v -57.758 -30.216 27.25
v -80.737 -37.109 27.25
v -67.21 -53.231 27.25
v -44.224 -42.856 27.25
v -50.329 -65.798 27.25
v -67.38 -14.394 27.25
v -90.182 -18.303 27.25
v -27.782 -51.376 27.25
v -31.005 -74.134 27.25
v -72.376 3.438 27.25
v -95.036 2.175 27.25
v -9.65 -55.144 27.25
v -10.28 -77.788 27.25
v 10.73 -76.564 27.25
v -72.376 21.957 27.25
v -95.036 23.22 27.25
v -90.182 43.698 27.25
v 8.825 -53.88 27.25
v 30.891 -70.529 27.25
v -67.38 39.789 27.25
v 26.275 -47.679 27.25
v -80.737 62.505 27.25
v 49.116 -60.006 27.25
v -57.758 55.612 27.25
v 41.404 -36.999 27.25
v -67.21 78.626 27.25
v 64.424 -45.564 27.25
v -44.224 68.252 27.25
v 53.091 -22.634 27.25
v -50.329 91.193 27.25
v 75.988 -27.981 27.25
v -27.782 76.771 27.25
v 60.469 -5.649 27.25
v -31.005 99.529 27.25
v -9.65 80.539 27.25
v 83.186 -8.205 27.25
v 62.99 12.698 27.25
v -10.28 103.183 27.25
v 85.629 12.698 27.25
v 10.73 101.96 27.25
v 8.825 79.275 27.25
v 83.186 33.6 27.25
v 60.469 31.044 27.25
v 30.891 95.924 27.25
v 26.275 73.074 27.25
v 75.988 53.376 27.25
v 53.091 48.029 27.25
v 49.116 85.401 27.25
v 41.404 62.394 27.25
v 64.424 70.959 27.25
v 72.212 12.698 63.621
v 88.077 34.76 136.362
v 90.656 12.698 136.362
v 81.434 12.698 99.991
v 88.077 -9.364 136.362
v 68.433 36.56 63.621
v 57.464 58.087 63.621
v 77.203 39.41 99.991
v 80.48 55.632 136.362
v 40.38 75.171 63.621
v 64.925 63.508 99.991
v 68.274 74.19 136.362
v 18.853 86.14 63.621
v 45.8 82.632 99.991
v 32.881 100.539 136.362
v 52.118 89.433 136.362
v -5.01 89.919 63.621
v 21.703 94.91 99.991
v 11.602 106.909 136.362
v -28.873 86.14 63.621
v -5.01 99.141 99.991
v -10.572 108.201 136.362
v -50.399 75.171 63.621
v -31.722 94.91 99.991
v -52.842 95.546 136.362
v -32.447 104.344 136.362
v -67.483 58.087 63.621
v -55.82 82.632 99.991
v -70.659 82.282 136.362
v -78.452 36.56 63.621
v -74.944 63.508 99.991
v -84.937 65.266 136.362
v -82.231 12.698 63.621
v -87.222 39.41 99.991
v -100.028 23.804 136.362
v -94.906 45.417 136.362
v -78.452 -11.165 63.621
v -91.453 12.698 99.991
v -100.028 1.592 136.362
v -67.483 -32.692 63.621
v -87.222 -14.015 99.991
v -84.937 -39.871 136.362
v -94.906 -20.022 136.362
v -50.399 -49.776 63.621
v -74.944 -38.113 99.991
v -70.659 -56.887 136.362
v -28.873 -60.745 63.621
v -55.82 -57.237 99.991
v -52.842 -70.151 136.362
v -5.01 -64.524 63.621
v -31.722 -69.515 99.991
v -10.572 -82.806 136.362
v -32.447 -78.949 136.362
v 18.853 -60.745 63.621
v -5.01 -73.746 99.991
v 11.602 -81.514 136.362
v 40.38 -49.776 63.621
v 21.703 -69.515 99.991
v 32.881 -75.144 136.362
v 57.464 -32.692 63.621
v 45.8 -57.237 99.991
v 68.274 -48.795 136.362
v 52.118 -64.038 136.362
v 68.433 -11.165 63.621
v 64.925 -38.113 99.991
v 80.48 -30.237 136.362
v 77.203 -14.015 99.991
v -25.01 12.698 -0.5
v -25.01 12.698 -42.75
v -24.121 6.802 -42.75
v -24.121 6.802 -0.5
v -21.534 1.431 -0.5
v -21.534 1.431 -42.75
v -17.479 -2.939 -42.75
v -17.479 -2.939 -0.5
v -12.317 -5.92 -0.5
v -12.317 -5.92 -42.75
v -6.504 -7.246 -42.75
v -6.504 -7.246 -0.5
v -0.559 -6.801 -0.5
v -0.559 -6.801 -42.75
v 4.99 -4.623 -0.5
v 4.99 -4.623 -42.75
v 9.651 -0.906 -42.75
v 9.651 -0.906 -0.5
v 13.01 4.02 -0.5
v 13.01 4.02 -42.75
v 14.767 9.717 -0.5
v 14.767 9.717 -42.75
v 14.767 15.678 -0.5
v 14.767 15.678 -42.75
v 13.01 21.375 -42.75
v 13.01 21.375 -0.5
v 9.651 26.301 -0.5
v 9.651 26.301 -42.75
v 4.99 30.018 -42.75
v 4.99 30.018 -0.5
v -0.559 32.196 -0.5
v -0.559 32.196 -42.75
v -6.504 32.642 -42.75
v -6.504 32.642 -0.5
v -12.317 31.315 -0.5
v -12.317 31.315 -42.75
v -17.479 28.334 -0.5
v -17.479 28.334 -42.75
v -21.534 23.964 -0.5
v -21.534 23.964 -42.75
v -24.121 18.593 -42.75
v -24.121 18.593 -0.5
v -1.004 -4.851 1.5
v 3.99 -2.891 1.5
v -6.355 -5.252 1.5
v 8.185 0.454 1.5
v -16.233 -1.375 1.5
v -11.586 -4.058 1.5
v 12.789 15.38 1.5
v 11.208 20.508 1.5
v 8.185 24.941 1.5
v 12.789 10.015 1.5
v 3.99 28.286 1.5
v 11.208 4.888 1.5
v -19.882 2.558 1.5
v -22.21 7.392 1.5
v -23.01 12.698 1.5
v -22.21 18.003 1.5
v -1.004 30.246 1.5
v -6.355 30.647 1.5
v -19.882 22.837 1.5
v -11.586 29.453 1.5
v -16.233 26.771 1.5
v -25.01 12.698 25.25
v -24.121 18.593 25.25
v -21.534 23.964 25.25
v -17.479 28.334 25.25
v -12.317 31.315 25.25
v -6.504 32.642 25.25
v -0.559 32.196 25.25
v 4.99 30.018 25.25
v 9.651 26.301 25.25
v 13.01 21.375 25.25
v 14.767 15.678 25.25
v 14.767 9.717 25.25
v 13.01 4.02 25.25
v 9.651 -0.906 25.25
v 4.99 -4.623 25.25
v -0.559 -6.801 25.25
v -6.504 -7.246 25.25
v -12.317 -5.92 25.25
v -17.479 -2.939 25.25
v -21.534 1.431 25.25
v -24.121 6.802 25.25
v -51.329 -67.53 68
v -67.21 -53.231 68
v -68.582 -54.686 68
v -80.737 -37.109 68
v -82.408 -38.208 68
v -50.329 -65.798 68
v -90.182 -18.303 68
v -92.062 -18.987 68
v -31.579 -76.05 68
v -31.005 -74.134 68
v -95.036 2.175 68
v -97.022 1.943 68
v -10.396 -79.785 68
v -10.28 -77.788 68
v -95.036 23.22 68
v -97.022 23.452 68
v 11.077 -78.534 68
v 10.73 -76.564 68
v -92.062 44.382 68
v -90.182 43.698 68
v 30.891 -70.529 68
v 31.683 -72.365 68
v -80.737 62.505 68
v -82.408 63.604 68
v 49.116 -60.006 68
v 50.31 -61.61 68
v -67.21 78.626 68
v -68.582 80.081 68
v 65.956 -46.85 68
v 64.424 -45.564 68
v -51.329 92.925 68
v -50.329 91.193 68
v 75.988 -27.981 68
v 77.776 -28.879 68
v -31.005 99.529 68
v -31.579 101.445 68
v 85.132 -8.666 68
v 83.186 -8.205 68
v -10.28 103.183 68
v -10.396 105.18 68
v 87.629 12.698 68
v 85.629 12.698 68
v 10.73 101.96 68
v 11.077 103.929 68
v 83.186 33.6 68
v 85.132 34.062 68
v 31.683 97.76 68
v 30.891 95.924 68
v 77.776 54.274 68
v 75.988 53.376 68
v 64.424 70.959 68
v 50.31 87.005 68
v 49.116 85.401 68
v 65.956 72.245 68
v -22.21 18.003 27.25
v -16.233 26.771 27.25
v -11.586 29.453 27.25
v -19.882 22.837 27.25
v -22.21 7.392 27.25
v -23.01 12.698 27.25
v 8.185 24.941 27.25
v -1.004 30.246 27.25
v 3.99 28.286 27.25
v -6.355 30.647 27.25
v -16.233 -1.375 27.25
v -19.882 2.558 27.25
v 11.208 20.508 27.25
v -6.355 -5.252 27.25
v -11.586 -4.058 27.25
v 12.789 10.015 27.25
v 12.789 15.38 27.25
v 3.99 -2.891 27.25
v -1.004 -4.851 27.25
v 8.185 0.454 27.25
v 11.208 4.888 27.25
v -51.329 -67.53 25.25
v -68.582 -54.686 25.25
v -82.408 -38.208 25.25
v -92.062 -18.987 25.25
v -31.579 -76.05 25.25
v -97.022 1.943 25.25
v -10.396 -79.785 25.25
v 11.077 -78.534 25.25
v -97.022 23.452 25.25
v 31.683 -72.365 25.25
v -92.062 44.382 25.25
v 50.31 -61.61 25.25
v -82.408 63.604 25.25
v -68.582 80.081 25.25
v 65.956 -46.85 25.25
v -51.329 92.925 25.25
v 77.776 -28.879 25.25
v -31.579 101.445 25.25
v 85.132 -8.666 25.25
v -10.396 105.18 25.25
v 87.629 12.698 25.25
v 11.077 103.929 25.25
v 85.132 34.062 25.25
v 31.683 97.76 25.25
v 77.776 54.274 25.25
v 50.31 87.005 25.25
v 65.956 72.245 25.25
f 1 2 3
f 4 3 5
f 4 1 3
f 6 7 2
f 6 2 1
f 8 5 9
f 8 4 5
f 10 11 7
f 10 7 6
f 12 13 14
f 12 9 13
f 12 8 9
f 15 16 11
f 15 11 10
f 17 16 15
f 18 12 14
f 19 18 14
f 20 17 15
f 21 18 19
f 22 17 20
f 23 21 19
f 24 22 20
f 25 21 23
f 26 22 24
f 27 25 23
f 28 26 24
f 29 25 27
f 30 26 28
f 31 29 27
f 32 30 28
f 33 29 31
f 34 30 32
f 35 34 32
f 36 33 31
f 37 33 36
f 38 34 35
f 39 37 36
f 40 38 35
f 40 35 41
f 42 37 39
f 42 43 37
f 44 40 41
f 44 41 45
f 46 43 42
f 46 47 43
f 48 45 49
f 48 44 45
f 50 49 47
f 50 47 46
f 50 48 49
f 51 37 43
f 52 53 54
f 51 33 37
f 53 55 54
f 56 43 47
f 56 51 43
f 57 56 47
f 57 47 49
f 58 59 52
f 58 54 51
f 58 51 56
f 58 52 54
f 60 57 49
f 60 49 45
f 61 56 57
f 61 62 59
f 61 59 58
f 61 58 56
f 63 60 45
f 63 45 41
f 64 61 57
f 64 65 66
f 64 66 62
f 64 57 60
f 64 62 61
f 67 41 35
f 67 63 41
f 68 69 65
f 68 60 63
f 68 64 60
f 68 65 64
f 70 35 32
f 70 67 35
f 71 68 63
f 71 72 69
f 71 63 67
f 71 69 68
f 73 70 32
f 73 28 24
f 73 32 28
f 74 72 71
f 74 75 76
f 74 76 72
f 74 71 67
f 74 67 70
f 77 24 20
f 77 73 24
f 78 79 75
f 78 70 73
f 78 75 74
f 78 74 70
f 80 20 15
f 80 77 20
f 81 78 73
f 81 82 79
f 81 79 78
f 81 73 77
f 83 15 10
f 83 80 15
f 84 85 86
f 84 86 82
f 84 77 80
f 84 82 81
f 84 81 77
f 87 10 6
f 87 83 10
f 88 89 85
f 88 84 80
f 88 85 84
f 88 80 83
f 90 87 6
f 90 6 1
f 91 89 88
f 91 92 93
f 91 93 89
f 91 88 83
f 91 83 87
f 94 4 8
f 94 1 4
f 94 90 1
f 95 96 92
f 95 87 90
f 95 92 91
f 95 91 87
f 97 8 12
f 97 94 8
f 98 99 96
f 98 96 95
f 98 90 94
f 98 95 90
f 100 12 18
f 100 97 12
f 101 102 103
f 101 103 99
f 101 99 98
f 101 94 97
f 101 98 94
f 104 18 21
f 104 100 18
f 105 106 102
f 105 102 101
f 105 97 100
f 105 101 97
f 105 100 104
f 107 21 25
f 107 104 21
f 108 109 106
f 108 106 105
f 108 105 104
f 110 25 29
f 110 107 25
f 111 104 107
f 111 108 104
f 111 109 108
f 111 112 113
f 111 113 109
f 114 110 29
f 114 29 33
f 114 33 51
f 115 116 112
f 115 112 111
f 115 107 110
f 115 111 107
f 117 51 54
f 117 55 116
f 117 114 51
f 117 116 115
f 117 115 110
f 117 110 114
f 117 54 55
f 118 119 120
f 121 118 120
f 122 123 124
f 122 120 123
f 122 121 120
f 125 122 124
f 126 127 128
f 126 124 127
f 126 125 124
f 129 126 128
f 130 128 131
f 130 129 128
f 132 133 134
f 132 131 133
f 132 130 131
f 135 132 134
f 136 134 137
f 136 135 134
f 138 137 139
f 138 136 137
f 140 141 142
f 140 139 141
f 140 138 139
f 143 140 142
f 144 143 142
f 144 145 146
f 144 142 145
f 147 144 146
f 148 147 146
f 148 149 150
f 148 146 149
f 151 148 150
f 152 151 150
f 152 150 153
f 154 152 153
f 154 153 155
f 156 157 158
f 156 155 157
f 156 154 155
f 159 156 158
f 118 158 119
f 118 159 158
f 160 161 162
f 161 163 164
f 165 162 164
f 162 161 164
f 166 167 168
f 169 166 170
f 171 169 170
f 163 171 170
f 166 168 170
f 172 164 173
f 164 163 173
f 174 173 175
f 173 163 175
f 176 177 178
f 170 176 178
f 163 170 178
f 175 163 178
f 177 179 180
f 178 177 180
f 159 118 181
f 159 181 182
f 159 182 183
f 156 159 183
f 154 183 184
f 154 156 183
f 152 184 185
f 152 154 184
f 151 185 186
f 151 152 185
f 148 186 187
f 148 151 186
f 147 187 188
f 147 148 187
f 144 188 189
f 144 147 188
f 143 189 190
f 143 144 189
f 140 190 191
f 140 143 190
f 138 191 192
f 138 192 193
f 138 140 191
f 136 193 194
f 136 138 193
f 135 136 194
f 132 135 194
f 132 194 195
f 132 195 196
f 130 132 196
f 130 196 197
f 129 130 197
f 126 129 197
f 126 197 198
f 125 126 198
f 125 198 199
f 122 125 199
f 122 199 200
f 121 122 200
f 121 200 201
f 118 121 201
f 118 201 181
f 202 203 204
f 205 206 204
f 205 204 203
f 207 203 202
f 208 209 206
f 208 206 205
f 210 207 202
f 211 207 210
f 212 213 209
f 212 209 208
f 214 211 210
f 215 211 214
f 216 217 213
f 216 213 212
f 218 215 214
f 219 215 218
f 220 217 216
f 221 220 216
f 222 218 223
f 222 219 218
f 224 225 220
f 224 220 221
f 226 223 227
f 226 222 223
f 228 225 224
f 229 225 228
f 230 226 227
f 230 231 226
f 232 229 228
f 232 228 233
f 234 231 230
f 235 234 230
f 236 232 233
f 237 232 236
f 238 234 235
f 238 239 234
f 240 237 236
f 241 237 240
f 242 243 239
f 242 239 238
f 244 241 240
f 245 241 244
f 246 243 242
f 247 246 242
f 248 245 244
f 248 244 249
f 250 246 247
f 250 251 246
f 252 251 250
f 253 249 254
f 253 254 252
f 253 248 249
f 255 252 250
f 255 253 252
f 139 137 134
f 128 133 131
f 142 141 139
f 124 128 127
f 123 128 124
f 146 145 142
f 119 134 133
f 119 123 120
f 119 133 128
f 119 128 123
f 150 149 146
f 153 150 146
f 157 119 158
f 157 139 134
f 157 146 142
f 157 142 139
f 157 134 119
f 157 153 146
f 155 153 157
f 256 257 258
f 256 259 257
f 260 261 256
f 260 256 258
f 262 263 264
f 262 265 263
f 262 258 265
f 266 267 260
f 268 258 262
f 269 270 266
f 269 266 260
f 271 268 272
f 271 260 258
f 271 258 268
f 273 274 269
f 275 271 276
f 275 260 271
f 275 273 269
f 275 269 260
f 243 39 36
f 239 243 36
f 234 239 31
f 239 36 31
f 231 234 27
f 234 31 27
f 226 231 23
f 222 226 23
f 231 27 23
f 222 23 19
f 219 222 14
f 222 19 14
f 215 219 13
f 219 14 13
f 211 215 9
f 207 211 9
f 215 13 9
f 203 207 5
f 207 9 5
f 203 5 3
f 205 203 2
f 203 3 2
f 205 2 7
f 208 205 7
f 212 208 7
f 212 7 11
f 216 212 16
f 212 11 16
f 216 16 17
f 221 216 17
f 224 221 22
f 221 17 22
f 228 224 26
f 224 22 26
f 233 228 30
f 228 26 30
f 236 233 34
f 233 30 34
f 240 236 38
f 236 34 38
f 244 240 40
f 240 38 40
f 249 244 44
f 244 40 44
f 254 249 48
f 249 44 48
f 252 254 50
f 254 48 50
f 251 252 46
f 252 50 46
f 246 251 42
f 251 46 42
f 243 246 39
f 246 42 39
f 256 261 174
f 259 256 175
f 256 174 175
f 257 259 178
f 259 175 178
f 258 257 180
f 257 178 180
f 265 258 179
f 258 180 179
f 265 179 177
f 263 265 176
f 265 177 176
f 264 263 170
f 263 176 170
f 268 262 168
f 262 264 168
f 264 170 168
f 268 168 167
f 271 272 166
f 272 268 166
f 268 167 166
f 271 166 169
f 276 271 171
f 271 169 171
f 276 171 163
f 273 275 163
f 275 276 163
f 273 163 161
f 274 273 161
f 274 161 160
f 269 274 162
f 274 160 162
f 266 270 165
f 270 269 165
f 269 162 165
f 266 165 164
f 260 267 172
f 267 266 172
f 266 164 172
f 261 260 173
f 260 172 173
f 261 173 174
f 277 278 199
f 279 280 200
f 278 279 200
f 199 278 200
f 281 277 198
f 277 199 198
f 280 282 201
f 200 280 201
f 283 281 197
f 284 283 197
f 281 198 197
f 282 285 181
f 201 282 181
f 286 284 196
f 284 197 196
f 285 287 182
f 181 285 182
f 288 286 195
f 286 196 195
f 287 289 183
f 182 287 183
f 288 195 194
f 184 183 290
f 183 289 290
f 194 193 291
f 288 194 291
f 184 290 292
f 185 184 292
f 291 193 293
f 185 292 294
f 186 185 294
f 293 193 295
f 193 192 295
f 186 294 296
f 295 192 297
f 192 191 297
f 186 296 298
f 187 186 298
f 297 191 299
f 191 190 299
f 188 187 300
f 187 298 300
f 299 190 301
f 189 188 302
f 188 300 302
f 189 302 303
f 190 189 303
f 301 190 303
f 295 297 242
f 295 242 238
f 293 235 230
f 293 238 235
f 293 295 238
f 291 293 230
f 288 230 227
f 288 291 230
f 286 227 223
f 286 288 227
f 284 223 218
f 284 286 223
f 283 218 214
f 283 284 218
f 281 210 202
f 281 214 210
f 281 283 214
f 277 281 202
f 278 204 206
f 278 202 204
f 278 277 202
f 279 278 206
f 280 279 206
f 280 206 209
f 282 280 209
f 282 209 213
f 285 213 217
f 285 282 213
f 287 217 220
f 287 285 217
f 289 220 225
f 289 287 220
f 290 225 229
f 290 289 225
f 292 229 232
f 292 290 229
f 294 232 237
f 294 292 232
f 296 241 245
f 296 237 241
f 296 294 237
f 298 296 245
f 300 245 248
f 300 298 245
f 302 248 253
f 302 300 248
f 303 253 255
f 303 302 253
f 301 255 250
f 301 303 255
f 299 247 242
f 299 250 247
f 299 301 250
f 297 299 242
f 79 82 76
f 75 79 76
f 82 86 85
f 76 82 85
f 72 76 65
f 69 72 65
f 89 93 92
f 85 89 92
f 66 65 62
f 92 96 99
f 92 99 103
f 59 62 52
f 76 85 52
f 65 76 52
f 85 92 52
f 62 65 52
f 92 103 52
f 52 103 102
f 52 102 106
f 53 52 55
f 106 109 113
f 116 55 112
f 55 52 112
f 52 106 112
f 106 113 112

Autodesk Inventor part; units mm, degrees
ref_plane "YZ Plane" through (0, 0, 0) normal (1, 0, 0) x (0, 1, 0)
ref_plane "XY Plane" through (0, 0, 0) normal (0, 0, 1) x (1, 0, 0)
ref_plane "Work Plane1" through (0, 0, -0.5) normal (0, 0, -1) x (-1, 0, 0)
sketch "Sketch1" plane through (0, 0, -0.5) normal (0, 0, -1) x (-1, 0, 0)
  line L0 (134.0347, 37.6976) -> (134.0347, -12.3024) projected
  line L1 (134.0347, 37.6976) -> (30.0097, 37.6976) projected
  line L2 (30.0097, 37.6976) -> (30.0097, 128.6976) projected
  line L3 (-19.9903, 128.6976) -> (30.0097, 128.6976) projected
  line L4 (-19.9903, 128.6976) -> (-19.9903, 37.6976) projected
  line L5 (-19.9903, 37.6976) -> (-140.9903, 37.6976) projected
  line L6 (-140.9903, -12.3024) -> (-140.9903, 37.6976) projected
  line L7 (-140.9903, -12.3024) -> (-19.9903, -12.3024) projected
  line L8 (-19.9903, -12.3024) -> (-19.9903, -146.3274) projected
  line L9 (30.0097, -146.3274) -> (-19.9903, -146.3274) projected
  line L10 (30.0097, -146.3274) -> (30.0097, -12.3024) projected
  line L11 (30.0097, -12.3024) -> (134.0347, -12.3024) projected
  line L12 (-19.9903, 37.6976) -> (30.0097, -12.3024) construction
  line L13 (30.0097, 37.6976) -> (-19.9903, -12.3024) construction
  circle A0 centre (5.0097, 12.6976) radius 20
  point P0 (0, 0)
  dimension "d0" = 40
extrude "Extrusion1" add sketch "Sketch1" against normal blind 25.75 contours A0
sketch "Sketch2" plane through (-5.0097, 12.6976, 25.25) normal (0, 0, 1) x (1, 0, 0)
  circle A0 centre (0, 0) radius 92.639
  point P0 (5.0097, -12.6976)
extrude "Extrusion2" add sketch "Sketch2" along normal blind 42.75
shell "Shell1" thickness 2 removed faces 1 at (-24.2409, 34.4376, 68)
ref_plane "Work Plane3" through (-5.0097, 12.6976, -0.5) normal (0, 1, 0) x (-1, 0, 0)
ref_plane "Work Plane2" through (-5.0097, -7.3024, -0.5) normal (0, 1, 0) x (-1, 0, 0)
sketch "Sketch3" plane through (-5.0097, 12.6976, -0.5) normal (0, 1, 0) x (-1, 0, 0)
  line L0 (18, 27.75) -> (-18, 27.75) projected
  line L1 (0, 27.75) -> (-68, 27.75)
  line L2 (90.639, 27.75) -> (-90.639, 27.75) projected
  line L3 (-68, 27.75) -> (-95.6652, 136.8622)
  line L4 (-95.6652, 136.8622) -> (0, 136.8622)
  line L5 (0, 136.8622) -> (0, 27.75)
  point P0 (-5.0097, 0.5)
  dimension "d8" = 95.6652
  dimension "d9" = 68
revolve "Revolution1" add sketch "Sketch3" angle 360 about axis through (-5.0097, 12.6976, 136.3622) along (0, 0, -1)
ref_plane "Work Plane4" through (-298.3836, 2.4745, -42.75) normal (0, 0, -1) x (0, 1, 0)
sketch "Sketch4" plane through (-5.0097, 12.6976, -0.5) normal (0, 0, -1) x (-1, 0, 0)
  circle A0 centre (0, 0) radius 20 projected
  point P0 (-5.0097, -12.6976)
extrude "Extrusion3" add sketch "Sketch4" along normal up to surface (42.25 mm away)
properties part number "BRUSH1"
